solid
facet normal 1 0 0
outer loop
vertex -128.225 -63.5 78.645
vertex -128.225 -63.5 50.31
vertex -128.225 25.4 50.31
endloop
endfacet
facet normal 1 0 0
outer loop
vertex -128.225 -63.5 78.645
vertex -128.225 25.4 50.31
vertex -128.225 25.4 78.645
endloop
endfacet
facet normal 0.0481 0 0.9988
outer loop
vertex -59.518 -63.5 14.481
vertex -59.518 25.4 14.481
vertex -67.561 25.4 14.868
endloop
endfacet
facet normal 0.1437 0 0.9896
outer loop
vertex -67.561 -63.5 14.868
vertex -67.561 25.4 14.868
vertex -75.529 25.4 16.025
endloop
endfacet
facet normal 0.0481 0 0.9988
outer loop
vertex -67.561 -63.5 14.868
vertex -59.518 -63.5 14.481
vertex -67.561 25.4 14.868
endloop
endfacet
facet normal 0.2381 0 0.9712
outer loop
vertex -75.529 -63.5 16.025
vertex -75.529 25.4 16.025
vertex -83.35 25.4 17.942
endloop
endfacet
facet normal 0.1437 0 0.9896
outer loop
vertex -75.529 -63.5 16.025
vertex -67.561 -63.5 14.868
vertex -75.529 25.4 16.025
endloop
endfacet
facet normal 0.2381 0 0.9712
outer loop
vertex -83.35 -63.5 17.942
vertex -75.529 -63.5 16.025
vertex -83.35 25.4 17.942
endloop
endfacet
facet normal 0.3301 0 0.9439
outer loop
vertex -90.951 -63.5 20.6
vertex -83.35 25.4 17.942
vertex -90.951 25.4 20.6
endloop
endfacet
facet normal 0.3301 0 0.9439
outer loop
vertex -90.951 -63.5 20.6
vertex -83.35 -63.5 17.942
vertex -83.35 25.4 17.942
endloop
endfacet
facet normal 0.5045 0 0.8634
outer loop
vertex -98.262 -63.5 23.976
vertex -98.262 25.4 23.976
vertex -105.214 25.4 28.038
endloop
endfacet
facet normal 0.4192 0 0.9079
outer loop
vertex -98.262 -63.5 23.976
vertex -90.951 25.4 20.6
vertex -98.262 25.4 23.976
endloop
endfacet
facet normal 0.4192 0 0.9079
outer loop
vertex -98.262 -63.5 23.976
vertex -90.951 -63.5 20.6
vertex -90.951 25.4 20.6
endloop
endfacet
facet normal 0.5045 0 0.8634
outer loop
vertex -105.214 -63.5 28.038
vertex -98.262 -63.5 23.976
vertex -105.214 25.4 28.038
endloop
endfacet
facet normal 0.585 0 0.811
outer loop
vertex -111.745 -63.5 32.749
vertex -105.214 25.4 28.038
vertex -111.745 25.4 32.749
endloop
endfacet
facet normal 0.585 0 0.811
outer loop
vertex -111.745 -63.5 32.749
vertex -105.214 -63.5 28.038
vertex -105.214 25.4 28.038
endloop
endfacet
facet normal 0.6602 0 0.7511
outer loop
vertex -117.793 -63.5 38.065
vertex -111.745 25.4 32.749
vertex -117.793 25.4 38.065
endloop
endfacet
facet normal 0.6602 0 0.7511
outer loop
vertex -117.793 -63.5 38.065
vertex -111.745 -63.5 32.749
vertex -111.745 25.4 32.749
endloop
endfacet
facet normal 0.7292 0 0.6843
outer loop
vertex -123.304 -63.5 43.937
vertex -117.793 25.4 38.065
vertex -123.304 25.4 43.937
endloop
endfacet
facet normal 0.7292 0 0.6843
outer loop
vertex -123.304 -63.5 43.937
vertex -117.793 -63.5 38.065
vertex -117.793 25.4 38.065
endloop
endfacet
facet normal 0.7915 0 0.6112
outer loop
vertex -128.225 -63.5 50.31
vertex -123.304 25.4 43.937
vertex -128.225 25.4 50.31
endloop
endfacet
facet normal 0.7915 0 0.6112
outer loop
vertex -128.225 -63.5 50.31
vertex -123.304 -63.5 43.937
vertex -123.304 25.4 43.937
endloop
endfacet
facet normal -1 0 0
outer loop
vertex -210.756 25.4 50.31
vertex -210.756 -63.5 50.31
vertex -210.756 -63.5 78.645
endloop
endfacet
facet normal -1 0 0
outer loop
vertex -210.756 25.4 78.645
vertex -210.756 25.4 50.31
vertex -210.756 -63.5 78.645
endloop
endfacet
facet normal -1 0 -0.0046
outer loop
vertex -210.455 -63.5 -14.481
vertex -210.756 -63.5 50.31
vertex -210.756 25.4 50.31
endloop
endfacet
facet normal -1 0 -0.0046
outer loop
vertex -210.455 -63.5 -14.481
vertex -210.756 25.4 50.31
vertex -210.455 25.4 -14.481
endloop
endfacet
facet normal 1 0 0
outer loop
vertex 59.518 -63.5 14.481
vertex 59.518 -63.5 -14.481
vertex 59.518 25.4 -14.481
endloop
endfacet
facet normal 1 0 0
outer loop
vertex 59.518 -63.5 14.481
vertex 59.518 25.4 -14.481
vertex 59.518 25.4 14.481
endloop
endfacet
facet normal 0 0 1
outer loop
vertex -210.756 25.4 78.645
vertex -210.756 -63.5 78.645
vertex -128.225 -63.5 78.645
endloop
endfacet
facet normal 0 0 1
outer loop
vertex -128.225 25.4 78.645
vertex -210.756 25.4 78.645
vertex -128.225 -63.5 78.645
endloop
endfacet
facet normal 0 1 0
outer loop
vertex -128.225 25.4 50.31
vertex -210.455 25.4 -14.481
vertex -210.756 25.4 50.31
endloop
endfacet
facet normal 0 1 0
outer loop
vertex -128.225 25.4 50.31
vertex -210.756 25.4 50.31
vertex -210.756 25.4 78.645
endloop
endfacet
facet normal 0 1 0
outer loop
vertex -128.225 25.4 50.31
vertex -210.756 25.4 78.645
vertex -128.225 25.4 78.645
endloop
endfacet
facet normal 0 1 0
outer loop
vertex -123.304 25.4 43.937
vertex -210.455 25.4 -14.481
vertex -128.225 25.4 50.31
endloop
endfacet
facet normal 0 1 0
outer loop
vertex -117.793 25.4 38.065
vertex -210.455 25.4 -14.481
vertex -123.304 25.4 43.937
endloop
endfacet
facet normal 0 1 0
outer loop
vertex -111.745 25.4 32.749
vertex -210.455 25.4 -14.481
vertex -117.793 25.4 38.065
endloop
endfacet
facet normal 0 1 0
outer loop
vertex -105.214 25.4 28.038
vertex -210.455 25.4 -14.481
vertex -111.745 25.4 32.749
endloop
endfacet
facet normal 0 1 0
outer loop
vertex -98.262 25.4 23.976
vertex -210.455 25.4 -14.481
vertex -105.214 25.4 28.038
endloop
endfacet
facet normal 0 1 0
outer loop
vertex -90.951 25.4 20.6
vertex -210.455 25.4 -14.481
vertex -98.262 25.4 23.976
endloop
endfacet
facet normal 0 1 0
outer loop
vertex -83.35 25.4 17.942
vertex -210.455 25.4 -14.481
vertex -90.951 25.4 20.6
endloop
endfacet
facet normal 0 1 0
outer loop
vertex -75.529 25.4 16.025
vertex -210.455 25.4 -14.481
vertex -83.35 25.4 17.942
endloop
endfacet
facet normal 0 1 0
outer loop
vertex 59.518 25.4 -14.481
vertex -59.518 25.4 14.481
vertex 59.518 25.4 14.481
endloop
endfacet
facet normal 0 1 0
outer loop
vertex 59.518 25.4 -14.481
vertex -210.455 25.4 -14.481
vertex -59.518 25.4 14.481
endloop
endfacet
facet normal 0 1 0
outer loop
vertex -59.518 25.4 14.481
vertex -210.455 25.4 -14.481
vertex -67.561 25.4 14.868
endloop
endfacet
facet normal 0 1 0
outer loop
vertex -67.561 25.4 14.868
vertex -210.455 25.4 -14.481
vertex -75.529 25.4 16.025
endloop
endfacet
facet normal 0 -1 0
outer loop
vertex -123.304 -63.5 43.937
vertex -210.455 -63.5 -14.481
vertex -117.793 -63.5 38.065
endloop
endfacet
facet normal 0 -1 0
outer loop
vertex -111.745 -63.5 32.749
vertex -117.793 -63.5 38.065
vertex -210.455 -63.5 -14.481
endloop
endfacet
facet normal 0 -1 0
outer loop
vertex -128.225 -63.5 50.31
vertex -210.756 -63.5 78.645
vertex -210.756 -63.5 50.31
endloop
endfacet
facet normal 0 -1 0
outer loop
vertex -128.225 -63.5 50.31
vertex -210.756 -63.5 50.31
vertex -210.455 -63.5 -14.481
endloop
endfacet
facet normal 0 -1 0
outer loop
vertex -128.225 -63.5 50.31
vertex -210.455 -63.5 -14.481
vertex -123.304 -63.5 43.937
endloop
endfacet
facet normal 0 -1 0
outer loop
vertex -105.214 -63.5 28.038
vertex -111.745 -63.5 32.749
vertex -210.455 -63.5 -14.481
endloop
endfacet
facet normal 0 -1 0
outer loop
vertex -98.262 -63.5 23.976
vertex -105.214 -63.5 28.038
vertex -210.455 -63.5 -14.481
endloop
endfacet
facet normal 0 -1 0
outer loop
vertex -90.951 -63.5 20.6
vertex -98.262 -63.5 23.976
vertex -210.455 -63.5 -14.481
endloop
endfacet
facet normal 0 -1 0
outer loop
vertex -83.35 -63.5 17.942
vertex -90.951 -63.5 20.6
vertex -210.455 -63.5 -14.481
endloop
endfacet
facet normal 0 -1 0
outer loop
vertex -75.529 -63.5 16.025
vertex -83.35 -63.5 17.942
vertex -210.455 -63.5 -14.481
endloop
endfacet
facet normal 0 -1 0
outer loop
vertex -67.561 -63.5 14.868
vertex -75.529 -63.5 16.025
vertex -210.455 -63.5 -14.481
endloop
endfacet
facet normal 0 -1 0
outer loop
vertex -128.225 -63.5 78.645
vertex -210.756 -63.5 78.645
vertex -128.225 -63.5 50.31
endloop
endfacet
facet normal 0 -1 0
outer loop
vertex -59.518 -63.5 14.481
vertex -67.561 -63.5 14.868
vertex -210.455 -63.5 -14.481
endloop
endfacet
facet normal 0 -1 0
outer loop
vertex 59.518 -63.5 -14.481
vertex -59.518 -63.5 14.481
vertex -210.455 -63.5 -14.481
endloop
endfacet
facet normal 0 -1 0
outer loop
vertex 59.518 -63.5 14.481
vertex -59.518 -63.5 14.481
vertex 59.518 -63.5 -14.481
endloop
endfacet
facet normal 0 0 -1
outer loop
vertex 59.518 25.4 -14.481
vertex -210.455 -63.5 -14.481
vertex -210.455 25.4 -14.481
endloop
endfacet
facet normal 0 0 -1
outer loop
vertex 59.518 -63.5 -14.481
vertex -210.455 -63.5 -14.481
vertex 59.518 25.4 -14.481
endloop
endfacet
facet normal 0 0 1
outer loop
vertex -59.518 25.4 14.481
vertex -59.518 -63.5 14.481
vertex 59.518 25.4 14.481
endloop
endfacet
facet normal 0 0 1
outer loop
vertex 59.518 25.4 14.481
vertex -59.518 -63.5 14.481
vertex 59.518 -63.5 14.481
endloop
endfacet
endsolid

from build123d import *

# Parameters (mm, degrees)
F0_W     = 119.03533
F0_H     = 28.961802
F0_W_2   = 82.531182
F0_H_2   = 28.334502
F1_DEPTH = 63.5
F2_DEPTH = 38.1


with BuildPart() as f1:
    # F0 (on Front) → F1 (new body, symmetric)
    with BuildSketch(Plane.XZ):
        Rectangle(F0_W, F0_H)
        with BuildLine():
            Line((-59.517665, -14.480901), (-59.517665, 14.480901))
            ThreePointArc((-59.517665, 14.480901), (-98.261712, 23.976224), (-128.224785, 50.310169))
            Line((-128.224785, 50.310169), (-210.755967, 50.310169))
            Line((-210.755967, 50.310169), (-210.454815, -14.480901))
            Line((-210.454815, -14.480901), (-59.517665, -14.480901))
        make_face()
        with Locations((-169.490376, 64.47742)):
            Rectangle(F0_W_2, F0_H_2)
    extrude(amount=F1_DEPTH, both=True)

    # F1_face (on face) → F2 (cut)
    with BuildSketch(Plane(origin=(-113.343632, 63.5, 19.109713), x_dir=(1, 0, 0), z_dir=(0, 1, 0))):
        with BuildLine():
            Line((172.861297, 4.628812), (172.861297, 33.590614))
            Line((172.861297, 33.590614), (-97.111183, 33.590614))
            Line((-97.111183, 33.590614), (-97.412335, -31.200456))
            Line((-97.412335, -31.200456), (-97.412335, -59.534958))
            Line((-97.412335, -59.534958), (-14.881153, -59.534958))
            Line((-14.881153, -59.534958), (-14.881153, -31.200456))
            ThreePointArc((-14.881153, -31.200456), (15.08192, -4.866511), (53.825967, 4.628812))
            Line((53.825967, 4.628812), (172.861297, 4.628812))
        make_face()
        with BuildLine():
            Line((-97.111183, 33.590614), (172.861297, 33.590614))
            Line((172.861297, 33.590614), (172.861297, 4.628812))
            Line((172.861297, 4.628812), (53.825967, 4.628812))
            ThreePointArc((53.825967, 4.628812), (15.08192, -4.866511), (-14.881153, -31.200456))
            Line((-14.881153, -31.200456), (-14.881153, -59.534958))
            Line((-14.881153, -59.534958), (-97.412335, -59.534958))
            Line((-97.412335, -59.534958), (-97.412335, -31.200456))
            Line((-97.412335, -31.200456), (-97.111183, 33.590614))
        make_face()
    extrude(amount=-F2_DEPTH, mode=Mode.SUBTRACT)


solid = f1.part
